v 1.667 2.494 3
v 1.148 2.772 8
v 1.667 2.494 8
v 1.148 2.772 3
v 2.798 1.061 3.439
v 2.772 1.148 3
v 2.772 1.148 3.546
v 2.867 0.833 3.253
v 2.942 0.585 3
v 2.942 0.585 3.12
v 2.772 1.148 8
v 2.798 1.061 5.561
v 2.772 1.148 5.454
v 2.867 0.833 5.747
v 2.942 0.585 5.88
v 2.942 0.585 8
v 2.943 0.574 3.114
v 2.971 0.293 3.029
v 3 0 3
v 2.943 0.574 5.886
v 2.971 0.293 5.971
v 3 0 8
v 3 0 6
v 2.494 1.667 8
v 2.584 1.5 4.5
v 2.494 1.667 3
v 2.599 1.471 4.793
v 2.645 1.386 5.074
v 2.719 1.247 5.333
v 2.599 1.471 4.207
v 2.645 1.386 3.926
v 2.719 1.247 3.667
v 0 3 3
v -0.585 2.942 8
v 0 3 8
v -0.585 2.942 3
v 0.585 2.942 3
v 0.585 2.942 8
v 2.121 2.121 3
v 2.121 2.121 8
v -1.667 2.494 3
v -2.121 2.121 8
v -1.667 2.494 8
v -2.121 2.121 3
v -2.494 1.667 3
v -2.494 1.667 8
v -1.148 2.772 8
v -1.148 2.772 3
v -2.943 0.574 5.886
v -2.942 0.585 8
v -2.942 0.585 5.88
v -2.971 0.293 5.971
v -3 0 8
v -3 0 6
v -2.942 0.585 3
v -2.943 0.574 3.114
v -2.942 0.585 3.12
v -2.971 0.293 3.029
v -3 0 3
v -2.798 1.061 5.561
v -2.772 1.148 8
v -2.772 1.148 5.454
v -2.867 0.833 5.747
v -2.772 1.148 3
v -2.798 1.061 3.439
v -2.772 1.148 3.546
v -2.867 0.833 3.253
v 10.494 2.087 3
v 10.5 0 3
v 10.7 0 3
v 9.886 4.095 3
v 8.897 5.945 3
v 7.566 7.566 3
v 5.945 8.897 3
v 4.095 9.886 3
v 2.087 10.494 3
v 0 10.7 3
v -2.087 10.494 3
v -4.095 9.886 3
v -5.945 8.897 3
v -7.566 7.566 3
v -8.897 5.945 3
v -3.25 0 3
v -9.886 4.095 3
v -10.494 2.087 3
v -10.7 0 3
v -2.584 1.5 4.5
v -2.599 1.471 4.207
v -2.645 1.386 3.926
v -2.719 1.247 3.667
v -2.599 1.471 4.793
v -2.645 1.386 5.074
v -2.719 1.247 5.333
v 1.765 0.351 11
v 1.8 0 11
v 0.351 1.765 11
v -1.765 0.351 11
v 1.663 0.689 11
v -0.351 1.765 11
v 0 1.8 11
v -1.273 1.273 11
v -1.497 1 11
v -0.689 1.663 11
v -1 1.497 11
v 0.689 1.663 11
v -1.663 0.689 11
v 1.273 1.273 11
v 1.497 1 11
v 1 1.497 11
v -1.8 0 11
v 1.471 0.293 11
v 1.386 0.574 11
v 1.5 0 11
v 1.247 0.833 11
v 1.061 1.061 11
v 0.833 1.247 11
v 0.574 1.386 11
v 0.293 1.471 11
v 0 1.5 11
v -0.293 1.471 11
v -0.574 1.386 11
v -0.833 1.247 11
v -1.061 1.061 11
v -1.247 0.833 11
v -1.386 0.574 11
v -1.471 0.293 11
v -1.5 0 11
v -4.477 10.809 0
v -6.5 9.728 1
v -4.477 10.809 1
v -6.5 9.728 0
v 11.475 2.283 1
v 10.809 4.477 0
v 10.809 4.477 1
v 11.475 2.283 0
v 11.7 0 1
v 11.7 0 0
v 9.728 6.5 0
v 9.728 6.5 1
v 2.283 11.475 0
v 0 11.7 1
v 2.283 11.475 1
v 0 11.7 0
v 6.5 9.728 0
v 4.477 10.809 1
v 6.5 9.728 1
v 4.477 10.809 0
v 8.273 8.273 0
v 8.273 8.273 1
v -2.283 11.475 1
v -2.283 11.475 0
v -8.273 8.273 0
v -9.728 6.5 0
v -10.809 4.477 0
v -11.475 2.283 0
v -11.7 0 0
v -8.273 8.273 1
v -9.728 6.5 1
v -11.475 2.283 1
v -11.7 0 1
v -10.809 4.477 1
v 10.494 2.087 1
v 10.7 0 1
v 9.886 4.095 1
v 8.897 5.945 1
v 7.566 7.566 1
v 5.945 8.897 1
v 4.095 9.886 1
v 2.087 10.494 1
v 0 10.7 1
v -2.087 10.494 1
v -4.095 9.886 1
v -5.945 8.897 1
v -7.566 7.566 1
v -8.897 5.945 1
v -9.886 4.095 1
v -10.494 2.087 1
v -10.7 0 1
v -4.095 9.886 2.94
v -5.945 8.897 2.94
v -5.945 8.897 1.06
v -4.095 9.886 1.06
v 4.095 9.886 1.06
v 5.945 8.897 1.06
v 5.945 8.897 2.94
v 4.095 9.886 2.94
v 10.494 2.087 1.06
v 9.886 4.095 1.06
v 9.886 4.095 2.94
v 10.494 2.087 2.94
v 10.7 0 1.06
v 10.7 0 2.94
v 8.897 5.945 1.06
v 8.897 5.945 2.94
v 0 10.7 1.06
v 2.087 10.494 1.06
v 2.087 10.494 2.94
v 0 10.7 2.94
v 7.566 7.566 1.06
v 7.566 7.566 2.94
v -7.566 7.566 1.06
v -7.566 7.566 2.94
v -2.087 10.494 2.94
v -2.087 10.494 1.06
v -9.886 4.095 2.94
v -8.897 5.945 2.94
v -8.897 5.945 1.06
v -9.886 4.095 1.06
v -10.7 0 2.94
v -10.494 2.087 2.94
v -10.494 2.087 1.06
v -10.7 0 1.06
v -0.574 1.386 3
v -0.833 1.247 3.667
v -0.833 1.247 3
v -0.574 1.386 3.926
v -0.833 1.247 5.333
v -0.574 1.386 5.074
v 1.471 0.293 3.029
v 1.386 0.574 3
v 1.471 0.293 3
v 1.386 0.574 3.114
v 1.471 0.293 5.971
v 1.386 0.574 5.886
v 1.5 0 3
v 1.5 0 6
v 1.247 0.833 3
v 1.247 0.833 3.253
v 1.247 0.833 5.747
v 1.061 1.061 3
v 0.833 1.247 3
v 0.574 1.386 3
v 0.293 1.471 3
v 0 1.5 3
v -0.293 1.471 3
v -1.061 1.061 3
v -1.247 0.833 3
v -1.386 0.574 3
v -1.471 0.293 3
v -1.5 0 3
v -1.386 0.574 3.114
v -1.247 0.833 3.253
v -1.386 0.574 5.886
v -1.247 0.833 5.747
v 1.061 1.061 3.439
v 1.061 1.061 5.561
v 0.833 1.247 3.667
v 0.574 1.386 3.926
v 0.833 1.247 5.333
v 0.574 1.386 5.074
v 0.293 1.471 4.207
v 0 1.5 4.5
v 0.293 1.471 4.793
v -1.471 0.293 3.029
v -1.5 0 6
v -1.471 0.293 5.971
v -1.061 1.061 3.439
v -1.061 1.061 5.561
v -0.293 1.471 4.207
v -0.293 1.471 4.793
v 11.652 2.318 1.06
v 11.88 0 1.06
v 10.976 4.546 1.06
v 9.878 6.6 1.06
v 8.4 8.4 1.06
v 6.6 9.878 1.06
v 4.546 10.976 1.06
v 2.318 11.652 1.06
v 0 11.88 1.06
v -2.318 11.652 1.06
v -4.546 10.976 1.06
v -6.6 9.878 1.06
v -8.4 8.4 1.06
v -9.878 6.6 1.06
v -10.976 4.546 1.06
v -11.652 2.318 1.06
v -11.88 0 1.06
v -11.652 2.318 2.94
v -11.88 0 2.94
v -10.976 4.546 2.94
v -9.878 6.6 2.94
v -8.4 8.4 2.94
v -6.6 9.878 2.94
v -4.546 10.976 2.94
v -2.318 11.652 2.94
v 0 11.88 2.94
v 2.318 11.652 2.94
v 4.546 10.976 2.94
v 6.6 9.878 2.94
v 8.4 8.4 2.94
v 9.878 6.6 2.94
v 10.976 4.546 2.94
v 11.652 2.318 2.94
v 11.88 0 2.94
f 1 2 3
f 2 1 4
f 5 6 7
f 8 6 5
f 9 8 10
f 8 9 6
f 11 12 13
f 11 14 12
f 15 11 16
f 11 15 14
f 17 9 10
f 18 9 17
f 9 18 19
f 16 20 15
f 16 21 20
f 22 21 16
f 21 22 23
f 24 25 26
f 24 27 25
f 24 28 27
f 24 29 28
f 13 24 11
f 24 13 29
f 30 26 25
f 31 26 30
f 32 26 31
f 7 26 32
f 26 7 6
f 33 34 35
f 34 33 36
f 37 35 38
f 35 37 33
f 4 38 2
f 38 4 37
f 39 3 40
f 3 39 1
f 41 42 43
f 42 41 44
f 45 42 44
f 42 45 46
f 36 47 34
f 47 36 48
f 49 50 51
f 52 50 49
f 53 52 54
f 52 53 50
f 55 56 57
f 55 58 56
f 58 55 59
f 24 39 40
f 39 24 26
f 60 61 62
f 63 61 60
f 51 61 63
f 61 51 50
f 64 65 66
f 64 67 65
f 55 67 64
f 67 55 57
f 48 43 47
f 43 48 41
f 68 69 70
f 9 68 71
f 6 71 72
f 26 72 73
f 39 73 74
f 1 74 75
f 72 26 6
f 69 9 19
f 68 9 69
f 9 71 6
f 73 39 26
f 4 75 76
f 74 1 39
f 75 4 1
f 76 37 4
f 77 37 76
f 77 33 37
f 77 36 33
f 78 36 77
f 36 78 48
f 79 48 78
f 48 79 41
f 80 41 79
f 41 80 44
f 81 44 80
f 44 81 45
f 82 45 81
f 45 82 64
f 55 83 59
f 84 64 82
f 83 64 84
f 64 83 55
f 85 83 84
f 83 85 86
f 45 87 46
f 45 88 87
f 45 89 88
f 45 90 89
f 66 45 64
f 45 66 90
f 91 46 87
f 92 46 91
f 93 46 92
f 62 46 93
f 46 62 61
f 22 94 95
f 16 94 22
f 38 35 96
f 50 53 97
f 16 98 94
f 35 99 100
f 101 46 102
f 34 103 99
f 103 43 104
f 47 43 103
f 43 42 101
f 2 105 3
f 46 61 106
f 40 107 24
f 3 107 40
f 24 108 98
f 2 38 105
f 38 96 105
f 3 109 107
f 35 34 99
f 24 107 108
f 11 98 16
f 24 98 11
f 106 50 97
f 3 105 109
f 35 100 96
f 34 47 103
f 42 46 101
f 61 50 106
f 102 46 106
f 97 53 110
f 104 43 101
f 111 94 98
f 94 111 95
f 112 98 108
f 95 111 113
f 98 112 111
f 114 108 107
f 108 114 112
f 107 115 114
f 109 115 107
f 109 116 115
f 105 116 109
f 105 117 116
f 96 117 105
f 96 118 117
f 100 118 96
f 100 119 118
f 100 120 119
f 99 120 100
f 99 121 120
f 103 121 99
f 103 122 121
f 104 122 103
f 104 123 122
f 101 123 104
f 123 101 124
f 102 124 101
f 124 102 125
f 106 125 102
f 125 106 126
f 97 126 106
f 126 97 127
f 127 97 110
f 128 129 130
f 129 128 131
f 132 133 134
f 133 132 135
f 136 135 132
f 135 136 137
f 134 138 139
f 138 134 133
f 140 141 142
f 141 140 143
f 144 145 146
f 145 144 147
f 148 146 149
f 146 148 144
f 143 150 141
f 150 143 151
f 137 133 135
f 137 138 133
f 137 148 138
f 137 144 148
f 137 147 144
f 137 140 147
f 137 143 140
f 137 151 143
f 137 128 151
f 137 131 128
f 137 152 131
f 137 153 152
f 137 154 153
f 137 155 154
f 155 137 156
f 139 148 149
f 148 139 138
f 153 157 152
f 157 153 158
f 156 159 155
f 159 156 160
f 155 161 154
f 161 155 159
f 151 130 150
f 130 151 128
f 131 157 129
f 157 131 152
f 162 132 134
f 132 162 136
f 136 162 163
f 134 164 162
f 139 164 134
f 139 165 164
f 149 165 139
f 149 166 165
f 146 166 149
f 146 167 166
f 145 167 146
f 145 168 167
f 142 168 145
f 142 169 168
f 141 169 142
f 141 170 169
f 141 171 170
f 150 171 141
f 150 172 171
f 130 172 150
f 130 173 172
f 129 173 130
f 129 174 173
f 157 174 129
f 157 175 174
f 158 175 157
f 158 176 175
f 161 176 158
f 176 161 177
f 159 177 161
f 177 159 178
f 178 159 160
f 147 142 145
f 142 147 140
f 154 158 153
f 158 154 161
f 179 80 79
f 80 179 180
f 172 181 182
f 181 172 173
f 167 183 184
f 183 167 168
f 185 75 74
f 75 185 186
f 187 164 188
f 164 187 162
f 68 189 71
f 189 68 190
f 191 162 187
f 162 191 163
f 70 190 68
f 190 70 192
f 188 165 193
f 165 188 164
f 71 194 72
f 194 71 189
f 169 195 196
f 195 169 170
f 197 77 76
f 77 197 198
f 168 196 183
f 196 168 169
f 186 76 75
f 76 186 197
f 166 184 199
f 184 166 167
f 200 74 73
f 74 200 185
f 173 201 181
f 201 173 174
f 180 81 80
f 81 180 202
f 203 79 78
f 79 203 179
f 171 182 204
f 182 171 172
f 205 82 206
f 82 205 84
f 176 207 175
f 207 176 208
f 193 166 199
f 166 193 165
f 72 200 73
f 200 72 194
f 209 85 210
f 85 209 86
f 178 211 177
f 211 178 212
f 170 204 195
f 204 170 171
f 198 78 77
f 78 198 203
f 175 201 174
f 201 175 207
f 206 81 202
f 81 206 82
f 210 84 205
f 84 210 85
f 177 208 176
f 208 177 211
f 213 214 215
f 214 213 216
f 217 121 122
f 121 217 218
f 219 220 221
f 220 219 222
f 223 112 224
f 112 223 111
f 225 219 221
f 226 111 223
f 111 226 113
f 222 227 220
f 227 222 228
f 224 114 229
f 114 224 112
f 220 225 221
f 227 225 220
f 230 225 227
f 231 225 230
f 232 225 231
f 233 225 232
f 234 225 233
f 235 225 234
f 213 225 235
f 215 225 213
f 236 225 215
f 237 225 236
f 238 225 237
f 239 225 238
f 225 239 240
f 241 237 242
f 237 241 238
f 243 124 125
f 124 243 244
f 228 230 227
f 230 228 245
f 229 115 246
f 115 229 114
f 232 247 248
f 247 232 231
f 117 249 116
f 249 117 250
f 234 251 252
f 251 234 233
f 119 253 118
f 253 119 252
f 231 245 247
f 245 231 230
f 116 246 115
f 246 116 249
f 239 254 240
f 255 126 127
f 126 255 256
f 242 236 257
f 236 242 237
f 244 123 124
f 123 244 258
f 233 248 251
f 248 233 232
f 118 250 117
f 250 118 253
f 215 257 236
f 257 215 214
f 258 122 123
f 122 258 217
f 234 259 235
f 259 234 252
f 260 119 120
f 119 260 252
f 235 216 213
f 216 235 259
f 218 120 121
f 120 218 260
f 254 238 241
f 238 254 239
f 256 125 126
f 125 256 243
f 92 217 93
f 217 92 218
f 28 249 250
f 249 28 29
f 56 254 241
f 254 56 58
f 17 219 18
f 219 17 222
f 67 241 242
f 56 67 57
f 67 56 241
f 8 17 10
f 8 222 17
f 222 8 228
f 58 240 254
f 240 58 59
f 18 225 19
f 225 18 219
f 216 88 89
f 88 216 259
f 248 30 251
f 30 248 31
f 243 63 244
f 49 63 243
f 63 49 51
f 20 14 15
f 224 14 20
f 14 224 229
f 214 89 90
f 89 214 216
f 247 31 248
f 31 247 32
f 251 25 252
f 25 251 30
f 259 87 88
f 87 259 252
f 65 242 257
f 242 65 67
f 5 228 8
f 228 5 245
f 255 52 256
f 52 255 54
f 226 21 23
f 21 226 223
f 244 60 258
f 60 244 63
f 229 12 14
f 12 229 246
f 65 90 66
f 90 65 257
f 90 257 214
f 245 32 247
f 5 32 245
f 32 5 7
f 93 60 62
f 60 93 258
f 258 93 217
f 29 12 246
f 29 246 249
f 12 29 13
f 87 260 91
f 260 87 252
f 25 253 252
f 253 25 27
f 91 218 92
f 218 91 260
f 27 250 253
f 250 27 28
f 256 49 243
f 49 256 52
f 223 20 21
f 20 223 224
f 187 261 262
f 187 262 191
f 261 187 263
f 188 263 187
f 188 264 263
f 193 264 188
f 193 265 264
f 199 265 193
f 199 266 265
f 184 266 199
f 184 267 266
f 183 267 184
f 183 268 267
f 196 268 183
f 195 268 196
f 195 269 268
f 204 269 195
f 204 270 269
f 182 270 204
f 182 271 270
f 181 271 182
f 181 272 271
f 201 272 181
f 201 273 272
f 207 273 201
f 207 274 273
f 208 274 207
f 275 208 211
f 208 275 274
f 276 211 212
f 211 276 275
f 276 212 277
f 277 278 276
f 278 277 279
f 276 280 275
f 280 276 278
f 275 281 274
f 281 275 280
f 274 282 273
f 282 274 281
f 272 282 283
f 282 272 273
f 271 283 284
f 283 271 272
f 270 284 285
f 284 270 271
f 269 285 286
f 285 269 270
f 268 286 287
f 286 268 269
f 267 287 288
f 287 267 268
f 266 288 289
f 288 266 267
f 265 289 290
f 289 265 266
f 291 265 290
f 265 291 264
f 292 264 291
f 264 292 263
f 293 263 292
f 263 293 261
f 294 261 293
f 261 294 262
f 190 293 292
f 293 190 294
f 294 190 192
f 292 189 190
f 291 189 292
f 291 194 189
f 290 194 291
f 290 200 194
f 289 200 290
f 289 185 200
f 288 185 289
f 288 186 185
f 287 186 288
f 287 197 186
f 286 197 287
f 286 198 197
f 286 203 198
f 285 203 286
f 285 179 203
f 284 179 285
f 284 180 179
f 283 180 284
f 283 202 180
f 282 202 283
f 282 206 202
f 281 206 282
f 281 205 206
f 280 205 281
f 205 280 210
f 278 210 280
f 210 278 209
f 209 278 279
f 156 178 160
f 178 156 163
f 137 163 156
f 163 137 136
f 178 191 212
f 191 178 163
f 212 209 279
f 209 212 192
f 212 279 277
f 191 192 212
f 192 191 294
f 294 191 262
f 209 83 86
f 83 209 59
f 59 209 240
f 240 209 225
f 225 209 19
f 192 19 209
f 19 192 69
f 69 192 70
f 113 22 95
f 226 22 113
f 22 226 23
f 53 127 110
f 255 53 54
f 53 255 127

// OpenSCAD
// file: ../stamp_generated.scad
// Defaults for OpenSCAD preview — overwritten by scripts/Export-OpenScadStl.ps1 on export.
// Lines: 1 brand, 2 product, 3 version (+ Prototype when preview).
info_stamp_line1 = "Verminology";
info_stamp_line2 = "Liquid Bait Station";
info_stamp_line3 = "v2.4 Prototype";
reservoir_stamp_bottom = false;
station_stamp_bottom = true;
needle_insert_export_stamp_bottom = false;
// file: needle-insert-lib.scad
// Needle insert library — include this (not `use`) so common.scad loads.
// F5 preview / STL: open needle-insert.scad or needle-insert-export.scad.
// Base: union of two cylinders — bottom 1 mm @ inner_bait_barrier_id, upper 2 mm @ bottom OD − 2 mm (diametric).

include <common.scad>

// TPU torus: relaxed inner R < upper step R, outer R > upper step R. Centered on z=0; mate with translate(…, needle_gasket_assembly_z).
module needle_gasket_ring() {
    ri = needle_gasket_relaxed_inner_r;
    ro = needle_gasket_relaxed_outer_r;
    hz = needle_gasket_relaxed_z_half;
    render_if_needed()
        rotate_extrude(angle = 360, convexity = 4)
            polygon([
                [ri, -hz],
                [ro, -hz],
                [ro, hz],
                [ri, hz],
            ]);
}

// Six flexible tabs: stem outer face flush with disk OD (R); only barb extends past R — enables insert + flex past bore.
module needle_insert_retention_clips() {
    R = needle_insert_base_bottom_od / 2;
    w = needle_insert_clip_tangent_width_mm;
    ad = needle_insert_clip_anchor_depth_mm;
    stem = needle_insert_clip_stem_radial_mm;
    br = needle_insert_clip_barb_radial_mm;
    bz = needle_insert_clip_barb_axial_mm;
    z0 = needle_insert_clip_z0;
    z_body_top = needle_insert_clip_body_z_top;
    z_barb_top = needle_insert_clip_barb_z_top;
    z_barb_bot = z_body_top - bz;
    for (i = [0 : needle_insert_clip_count - 1])
        rotate([0, 0, needle_insert_clip_phase_deg + i * (360 / needle_insert_clip_count)])
            render_if_needed()
                union() {
                    translate([R - ad - stem, -w / 2, z0])
                        cube([ad + stem, w, z_body_top - z0]);
                    translate([R, -w / 2, z_barb_bot])
                        cube([br, w, z_barb_top - z_barb_bot]);
                }
}

// Lower base step — plain cylinder only (no groove, no difference).
module needle_insert_base_bottom_cylinder() {
    cylinder(h = needle_insert_base_bottom_h, d = needle_insert_base_bottom_od);
}

// Upper base step — second cylinder only (stacked on bottom).
module needle_insert_base_upper_cylinder() {
    translate([0, 0, needle_insert_base_bottom_h])
        cylinder(h = needle_insert_base_gasket_step_h, d = needle_insert_gasket_land_od);
}

module needle_insert_channels() {
    // Vertical: from bottom of lateral port up (not through z=0 below lateral).
    vb = max(0, pin_channel_z_bottom);
    vh = pin_top + 0.5 - vb;
    translate([0, 0, vb])
        cylinder(h = vh, d = pin_channel_dia);
    translate([pin_tunnel_x_center, 0, pin_tunnel_z])
        rotate([0, 90, 0])
            cylinder(h = pin_tunnel_reach, d = pin_channel_dia, center = true);
}

// Solid: union(two base cylinders, pin…); channels subtract through the stack.
module needle_insert() {
    sh = pin_top - pin_tip_taper_h - needle_insert_disk_h;
    render_if_needed()
        difference() {
            union() {
                needle_insert_base_bottom_cylinder();
                needle_insert_base_upper_cylinder();
                translate([0, 0, needle_insert_disk_h]) {
                    cylinder(h = sh, d = pin_dia);
                    translate([0, 0, sh])
                        cylinder(h = pin_tip_taper_h, d1 = pin_dia, d2 = pin_tip_od);
                }
                if (needle_insert_retention_clips_enabled)
                    needle_insert_retention_clips();
            }
            needle_insert_channels();
        }
}

// Pocket: disk OD + clearance; extra radial margin only when retention clips enabled.
module needle_insert_pocket() {
    c = needle_insert_pocket_clearance;
    ze = needle_insert_pocket_z_extra;
    r_extra = needle_insert_retention_clips_enabled ? needle_insert_clip_pocket_radial_extra_mm : 0;
    r_clip = needle_insert_base_bottom_od / 2 + c + r_extra;
    z_clip_top = inner_barrier_rail_z_top + 0.08;
    translate([0, 0, -0.02])
        union() {
            cylinder(h = z_clip_top + 0.02 + ze, r = r_clip);
            translate([0, 0, z_clip_top])
                cylinder(h = pin_top - z_clip_top + 0.5 + ze, d = pin_dia + 2 * c);
        }
}
// main file
// Needle insert + TPU ring — sub-assembly preview (F5). Ring on upper base step OD; crosssection_view for torus.
// Default: mated. Set exploded = true to separate.

include <needle-insert-lib.scad>

crosssection_view = true;
exploded          = false;
explode_gap       = 14;

gasket_z_seated = needle_gasket_assembly_z;
insert_z_exploded = -explode_gap * 0.35;
gasket_z_exploded = gasket_z_seated + explode_gap * 0.65;

crosssection(needle_insert_base_bottom_od * 2) {
    color("DimGray", 0.95)
        translate([0, 0, exploded ? insert_z_exploded : 0])
            needle_insert();
    color("MediumSeaGreen", 0.85)
        translate([0, 0, exploded ? gasket_z_exploded : gasket_z_seated])
            needle_gasket_ring();
}
